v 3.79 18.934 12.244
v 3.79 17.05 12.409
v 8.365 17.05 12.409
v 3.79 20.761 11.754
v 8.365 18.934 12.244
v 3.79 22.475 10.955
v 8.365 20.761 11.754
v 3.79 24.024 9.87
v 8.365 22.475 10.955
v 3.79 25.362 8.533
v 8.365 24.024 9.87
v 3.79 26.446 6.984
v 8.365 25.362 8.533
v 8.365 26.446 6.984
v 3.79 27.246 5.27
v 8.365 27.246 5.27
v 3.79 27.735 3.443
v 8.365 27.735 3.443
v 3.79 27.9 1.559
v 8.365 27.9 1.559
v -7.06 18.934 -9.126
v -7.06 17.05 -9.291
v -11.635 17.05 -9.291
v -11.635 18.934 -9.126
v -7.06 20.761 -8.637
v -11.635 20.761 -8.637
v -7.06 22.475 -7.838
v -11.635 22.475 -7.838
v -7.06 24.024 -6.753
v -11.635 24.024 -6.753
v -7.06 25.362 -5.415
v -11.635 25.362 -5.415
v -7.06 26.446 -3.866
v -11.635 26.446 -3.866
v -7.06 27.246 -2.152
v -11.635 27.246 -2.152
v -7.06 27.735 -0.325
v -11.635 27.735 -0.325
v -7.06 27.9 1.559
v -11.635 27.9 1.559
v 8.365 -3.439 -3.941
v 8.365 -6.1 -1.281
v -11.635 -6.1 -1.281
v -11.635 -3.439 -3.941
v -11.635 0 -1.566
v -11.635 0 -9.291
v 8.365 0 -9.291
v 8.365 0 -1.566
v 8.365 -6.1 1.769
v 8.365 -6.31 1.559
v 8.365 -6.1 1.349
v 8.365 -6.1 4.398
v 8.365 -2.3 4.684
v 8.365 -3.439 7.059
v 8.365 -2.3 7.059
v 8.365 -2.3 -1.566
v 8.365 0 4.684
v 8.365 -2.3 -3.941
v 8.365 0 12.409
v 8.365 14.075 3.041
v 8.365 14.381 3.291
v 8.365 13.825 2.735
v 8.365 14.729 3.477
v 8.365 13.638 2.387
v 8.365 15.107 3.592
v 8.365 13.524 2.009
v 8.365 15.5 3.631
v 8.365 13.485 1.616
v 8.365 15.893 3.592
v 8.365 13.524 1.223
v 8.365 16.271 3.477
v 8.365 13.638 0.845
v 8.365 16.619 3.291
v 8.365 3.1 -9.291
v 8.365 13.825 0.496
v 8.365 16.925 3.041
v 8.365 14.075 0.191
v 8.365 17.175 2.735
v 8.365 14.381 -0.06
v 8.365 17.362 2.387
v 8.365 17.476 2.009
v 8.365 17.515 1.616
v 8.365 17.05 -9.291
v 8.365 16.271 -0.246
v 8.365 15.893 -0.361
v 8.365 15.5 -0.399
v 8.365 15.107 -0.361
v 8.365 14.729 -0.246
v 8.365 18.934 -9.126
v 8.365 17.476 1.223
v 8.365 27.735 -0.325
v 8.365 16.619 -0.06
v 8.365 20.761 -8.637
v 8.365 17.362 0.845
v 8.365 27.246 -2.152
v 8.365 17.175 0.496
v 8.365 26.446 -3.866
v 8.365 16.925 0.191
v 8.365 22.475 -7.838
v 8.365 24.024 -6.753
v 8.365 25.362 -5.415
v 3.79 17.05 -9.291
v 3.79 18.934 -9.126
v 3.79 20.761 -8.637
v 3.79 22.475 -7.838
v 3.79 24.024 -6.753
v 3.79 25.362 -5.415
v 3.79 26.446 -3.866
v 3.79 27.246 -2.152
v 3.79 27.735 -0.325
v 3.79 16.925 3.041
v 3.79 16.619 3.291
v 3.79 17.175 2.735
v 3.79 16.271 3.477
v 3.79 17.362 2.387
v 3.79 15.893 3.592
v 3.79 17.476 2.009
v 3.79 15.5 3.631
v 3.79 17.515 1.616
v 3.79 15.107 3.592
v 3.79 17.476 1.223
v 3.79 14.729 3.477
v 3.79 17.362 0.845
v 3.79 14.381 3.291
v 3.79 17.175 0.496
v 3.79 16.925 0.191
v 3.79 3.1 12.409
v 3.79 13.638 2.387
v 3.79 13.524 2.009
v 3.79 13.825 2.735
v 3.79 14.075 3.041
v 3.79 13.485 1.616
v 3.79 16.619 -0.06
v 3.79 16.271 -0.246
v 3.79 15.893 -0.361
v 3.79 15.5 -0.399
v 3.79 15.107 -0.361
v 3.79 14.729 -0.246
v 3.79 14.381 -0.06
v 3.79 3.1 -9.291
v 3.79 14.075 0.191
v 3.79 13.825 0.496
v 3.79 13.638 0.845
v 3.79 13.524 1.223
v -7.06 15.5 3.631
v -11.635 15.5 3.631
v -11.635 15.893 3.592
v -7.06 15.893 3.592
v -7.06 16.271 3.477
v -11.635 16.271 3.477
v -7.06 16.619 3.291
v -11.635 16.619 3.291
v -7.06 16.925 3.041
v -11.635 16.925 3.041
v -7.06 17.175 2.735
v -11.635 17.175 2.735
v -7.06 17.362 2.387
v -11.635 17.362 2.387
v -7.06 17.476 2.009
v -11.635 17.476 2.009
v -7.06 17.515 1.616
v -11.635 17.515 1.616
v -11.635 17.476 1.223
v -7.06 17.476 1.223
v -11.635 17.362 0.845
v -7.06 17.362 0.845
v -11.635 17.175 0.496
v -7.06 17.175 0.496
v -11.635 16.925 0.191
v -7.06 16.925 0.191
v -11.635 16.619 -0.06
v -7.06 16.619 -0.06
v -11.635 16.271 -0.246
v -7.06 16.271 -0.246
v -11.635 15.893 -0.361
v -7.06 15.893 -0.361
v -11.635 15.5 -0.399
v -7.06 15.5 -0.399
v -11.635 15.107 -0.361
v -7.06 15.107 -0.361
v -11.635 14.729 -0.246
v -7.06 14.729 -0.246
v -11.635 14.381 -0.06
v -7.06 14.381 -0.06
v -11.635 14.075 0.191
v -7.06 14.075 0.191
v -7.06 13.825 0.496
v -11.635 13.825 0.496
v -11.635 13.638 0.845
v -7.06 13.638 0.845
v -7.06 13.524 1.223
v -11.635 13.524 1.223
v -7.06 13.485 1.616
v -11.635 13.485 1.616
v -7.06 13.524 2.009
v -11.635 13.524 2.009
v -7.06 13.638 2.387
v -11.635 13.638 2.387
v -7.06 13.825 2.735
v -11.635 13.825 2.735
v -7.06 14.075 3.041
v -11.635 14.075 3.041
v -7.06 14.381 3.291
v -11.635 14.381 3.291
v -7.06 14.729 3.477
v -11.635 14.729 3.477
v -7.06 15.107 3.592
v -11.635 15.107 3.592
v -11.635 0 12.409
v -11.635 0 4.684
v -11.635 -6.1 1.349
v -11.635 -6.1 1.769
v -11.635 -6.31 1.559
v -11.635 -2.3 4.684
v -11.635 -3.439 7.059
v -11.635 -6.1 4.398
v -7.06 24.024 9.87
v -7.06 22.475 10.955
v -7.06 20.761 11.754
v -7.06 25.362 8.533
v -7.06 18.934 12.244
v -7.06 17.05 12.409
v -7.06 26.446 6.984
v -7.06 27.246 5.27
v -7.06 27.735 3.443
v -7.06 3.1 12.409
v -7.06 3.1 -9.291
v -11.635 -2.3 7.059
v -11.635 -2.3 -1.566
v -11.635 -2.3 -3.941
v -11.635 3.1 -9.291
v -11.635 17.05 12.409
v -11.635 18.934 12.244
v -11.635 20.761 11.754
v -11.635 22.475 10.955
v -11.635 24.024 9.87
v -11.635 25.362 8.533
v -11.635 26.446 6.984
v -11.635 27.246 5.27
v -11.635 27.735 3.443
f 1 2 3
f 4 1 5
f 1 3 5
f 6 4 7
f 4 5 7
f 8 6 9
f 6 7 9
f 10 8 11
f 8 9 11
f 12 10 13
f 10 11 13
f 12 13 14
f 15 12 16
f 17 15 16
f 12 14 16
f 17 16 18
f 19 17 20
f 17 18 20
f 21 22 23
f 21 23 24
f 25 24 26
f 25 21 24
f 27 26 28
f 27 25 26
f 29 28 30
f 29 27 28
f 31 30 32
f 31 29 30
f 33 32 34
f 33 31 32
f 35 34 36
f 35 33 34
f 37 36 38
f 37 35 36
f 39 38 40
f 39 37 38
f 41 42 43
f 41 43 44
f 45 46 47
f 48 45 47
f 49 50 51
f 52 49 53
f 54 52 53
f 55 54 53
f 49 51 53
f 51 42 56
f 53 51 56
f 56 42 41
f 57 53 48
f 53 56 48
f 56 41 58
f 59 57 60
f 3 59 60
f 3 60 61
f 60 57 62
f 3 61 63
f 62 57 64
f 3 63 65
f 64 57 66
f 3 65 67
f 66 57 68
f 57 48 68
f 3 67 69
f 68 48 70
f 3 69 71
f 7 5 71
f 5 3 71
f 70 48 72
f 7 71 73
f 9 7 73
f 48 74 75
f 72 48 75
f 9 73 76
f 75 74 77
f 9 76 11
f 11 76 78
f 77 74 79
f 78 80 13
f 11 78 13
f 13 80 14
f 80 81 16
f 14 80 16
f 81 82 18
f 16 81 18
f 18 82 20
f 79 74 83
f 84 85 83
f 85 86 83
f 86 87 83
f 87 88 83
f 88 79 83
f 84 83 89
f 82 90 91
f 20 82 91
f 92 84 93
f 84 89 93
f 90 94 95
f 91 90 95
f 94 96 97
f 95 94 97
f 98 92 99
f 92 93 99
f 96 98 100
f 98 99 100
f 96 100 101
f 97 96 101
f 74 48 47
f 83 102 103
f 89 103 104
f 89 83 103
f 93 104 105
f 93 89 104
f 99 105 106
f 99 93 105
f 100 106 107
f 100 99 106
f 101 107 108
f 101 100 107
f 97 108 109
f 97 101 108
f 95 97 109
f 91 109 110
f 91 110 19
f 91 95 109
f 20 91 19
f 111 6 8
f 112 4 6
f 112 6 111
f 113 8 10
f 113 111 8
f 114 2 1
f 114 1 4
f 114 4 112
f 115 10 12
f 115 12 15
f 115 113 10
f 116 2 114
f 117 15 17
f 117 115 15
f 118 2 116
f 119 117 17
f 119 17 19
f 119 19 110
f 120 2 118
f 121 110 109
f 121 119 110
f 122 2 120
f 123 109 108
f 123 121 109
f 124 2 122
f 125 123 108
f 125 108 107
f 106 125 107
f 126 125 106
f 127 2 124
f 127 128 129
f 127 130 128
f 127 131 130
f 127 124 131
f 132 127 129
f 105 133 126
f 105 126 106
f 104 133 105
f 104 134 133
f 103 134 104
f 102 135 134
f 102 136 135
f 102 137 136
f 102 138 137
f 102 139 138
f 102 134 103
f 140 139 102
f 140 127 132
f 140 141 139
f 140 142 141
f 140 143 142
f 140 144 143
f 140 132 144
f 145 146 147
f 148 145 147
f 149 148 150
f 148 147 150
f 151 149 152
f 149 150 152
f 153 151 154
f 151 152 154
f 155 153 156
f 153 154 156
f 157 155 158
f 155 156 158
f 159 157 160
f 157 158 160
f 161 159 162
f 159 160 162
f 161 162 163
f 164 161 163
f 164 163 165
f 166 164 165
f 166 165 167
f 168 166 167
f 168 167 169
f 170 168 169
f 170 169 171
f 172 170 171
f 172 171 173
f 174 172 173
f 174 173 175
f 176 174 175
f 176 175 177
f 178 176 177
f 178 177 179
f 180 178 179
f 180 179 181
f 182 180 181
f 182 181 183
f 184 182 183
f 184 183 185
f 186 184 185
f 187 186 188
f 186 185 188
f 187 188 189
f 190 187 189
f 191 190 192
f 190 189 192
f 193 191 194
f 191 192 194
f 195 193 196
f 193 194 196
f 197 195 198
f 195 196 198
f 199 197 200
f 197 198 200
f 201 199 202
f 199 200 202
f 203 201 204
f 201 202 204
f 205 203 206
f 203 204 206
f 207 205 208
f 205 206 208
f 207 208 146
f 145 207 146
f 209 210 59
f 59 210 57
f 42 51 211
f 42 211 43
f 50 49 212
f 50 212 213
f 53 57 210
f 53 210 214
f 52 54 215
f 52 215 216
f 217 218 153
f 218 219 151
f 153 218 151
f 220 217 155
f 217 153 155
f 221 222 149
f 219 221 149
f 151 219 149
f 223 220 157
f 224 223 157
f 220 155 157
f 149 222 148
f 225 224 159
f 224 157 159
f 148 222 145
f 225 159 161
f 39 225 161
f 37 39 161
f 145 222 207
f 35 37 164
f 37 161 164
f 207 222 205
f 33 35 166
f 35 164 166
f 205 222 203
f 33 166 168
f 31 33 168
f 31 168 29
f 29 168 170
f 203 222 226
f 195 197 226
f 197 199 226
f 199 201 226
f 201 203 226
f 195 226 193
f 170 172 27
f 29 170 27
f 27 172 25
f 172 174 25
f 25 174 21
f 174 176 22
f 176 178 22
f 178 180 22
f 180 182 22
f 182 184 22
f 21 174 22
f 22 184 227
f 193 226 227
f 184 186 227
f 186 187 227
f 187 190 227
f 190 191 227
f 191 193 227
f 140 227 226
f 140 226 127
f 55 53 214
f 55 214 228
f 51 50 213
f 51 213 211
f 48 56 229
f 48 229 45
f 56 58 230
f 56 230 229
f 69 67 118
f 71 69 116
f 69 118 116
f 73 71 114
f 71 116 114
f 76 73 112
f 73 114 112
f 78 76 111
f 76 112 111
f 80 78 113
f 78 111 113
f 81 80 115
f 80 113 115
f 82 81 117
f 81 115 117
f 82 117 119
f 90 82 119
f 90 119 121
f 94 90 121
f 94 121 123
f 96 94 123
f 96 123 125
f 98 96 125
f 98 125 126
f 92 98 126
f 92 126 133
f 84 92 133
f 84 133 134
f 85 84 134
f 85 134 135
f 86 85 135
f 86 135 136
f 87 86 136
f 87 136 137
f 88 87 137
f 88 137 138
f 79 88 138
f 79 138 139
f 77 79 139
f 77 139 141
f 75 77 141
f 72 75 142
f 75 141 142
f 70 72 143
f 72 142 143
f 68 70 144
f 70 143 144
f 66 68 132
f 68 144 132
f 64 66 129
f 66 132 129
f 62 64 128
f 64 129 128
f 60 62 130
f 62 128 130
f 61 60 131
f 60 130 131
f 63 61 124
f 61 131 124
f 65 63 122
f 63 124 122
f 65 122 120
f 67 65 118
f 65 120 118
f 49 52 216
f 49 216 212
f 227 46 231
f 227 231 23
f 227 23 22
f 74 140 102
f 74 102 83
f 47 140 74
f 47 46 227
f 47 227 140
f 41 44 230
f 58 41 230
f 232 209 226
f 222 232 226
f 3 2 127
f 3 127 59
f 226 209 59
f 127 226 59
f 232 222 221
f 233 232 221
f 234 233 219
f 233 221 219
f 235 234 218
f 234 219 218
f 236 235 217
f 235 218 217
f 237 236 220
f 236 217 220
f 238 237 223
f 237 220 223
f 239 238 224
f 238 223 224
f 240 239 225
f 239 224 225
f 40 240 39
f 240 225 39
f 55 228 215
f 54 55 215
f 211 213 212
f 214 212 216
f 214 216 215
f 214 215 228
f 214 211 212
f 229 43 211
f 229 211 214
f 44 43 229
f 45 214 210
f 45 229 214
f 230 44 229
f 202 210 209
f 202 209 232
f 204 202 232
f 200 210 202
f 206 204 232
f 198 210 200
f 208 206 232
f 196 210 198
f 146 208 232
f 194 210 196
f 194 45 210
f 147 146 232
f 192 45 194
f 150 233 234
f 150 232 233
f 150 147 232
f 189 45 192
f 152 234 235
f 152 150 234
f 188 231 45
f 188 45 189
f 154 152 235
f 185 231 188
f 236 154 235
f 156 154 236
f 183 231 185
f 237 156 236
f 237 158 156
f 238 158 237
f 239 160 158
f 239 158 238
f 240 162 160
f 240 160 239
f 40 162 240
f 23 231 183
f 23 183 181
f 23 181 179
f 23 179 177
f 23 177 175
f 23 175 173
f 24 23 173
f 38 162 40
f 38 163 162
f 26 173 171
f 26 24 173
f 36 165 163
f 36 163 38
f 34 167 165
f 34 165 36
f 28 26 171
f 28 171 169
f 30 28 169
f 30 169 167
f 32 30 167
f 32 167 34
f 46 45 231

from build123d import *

# Parameters (mm, degrees)
SKETCH1_W           = 150
SKETCH1_H           = 70
BOSS_EXTRUDE1_DEPTH = 10
SKETCH2_W           = 18
SKETCH2_H           = 70
BOSS_EXTRUDE2_DEPTH = 80
FILLET1_R           = 35
SKETCH3_R           = 6.5
CUT_EXTRUDE1_DEPTH  = 164.102034121
RIB1_REACH          = 134.904
SKETCH5_WALL_W      = 321.142477346
SKETCH5_WALL_H      = 40
SKETCH7_W           = 43.830511012
SKETCH7_H           = 10.028409091
CUT_EXTRUDE2_DEPTH  = 80
SCALE1_SCALE        = 0.31
CUT_EXTRUDE5_REACH  = 46.882
SKETCH11_W          = 1.005
SKETCH11_H          = 10.85
SKETCH11_H_2        = 13.95
BOSS_EXTRUDE3_DEPTH = 20


with BuildPart() as part:
    # Sketch1 → Boss-Extrude1 (new body)
    with BuildSketch(Plane(origin=(0, 0, 0), x_dir=(1, 0, 0), z_dir=(0, 1, 0))):
        with Locations((14.225473782, -5.028409091)):
            Rectangle(SKETCH1_W, SKETCH1_H)
    extrude(amount=BOSS_EXTRUDE1_DEPTH)

    # Sketch2 → Boss-Extrude2 (add)
    with BuildSketch(Plane(origin=(0, 10, 0), x_dir=(1, 0, 0), z_dir=(0, 1, 0))):
        with Locations((-31.774526218, -5.028409091)):
            Rectangle(SKETCH2_W, SKETCH2_H)
        with Locations((21.225473782, -5.028409091)):
            Rectangle(SKETCH2_W, SKETCH2_H)
    extrude(amount=BOSS_EXTRUDE2_DEPTH)

    # Fillet1
    fillet1_edges = [part.edges().sort_by_distance(p)[0] for p in [
        (21.225473782, 90, 40.028409091),
        (21.225473782, 90, -29.971590909),
        (-31.774526218, 90, -29.971590909),
        (-31.774526218, 90, 40.028409091),
    ]]
    fillet(fillet1_edges, radius=FILLET1_R - 0.0001)  # a hair under: the kernel refuses the full size

    # Sketch3 → Cut-Extrude1 (cut, through all)
    with BuildSketch(Plane.ZY.offset(40.774526218)):
        with Locations((5.212032143, 50)):
            Circle(SKETCH3_R)
    extrude(amount=-CUT_EXTRUDE1_DEPTH, mode=Mode.SUBTRACT)

    # Sketch5 wall → Rib1 (add, up to next)
    with BuildSketch(Plane(origin=(52.140729288, 25.194278726, 0), x_dir=(0.821802771323, -0.569772064116, 0), z_dir=(0.569772064116, 0.821802771323, 0)), mode=Mode.PRIVATE) as rib1_sk1:
        Rectangle(SKETCH5_WALL_W, SKETCH5_WALL_H)
    rib1_tool1 = extrude(rib1_sk1.sketch, amount=-RIB1_REACH, mode=Mode.PRIVATE) - part.part
    add(rib1_tool1.solids().sort_by_distance((52.140729288, 25.194278726, 0))[0])

    # Sketch7 → Cut-Extrude2 (cut)
    with BuildSketch(Plane(origin=(0, 10, 0), x_dir=(1, 0, 0), z_dir=(0, 1, 0))):
        with Locations((52.140729288, 14.985795454)):
            Rectangle(SKETCH7_W, SKETCH7_H)
    extrude(amount=CUT_EXTRUDE2_DEPTH, mode=Mode.SUBTRACT)


with BuildPart() as part_1:
    # Scale1: scaled about (0, 0, 0)
    add(part.part.scale(SCALE1_SCALE))

    # Sketch11 → Cut-Extrude5 (cut, up to next)
    with BuildSketch(Plane(origin=(0, 0, -9.291193182), x_dir=(-1, 0, 0), z_dir=(0, 0, -1)), mode=Mode.PRIVATE) as cut_extrude5_sk1:
        Polygon((-9.369896872, 3.1), (-8.364896872, 3.1), (-8.364896872, 17.05), (-9.369896872, 17.05), (-9.369896872, 12.52045281), align=None)
    cut_extrude5_tool1 = extrude(cut_extrude5_sk1.sketch, amount=-CUT_EXTRUDE5_REACH, mode=Mode.PRIVATE) & part_1.part
    # Sketch11 → Cut-Extrude5 (cut, up to next)
    with BuildSketch(Plane(origin=(0, 0, -9.291193182), x_dir=(-1, 0, 0), z_dir=(0, 0, -1)), mode=Mode.PRIVATE) as cut_extrude5_sk2:
        with Locations((-8.867396872, 22.475)):
            Rectangle(SKETCH11_W, SKETCH11_H)
    cut_extrude5_tool2 = extrude(cut_extrude5_sk2.sketch, amount=-CUT_EXTRUDE5_REACH, mode=Mode.PRIVATE) & part_1.part
    # Sketch11 → Cut-Extrude5 (cut, up to next)
    with BuildSketch(Plane(origin=(0, 0, -9.291193182), x_dir=(-1, 0, 0), z_dir=(0, 0, -1)), mode=Mode.PRIVATE) as cut_extrude5_sk3:
        Polygon((-22.957355286, 3.1), (-9.369896872, 3.1), (-9.369896872, 12.52045281), align=None)
    cut_extrude5_tool3 = extrude(cut_extrude5_sk3.sketch, amount=-CUT_EXTRUDE5_REACH, mode=Mode.PRIVATE) & part_1.part
    # Sketch11 → Cut-Extrude5 (cut, up to next)
    with BuildSketch(Plane(origin=(0, 0, -9.291193182), x_dir=(-1, 0, 0), z_dir=(0, 0, -1)), mode=Mode.PRIVATE) as cut_extrude5_sk4:
        Polygon((-8.364896872, 0), (-8.364896872, 3.1), (-9.369896872, 3.1), (-22.957355286, 3.1), (-27.659896872, 3.1), (-27.659896872, 0), align=None)
    cut_extrude5_tool4 = extrude(cut_extrude5_sk4.sketch, amount=-CUT_EXTRUDE5_REACH, mode=Mode.PRIVATE) & part_1.part
    # Sketch11 → Cut-Extrude5 (cut, up to next)
    with BuildSketch(Plane(origin=(0, 0, -9.291193182), x_dir=(-1, 0, 0), z_dir=(0, 0, -1)), mode=Mode.PRIVATE) as cut_extrude5_sk5:
        with Locations((12.137603128, 10.075)):
            Rectangle(SKETCH11_W, SKETCH11_H_2)
    cut_extrude5_tool5 = extrude(cut_extrude5_sk5.sketch, amount=-CUT_EXTRUDE5_REACH, mode=Mode.PRIVATE) & part_1.part
    # Sketch11 → Cut-Extrude5 (cut, up to next)
    with BuildSketch(Plane(origin=(0, 0, -9.291193182), x_dir=(-1, 0, 0), z_dir=(0, 0, -1)), mode=Mode.PRIVATE) as cut_extrude5_sk6:
        with Locations((12.137603128, 22.475)):
            Rectangle(SKETCH11_W, SKETCH11_H)
    cut_extrude5_tool6 = extrude(cut_extrude5_sk6.sketch, amount=-CUT_EXTRUDE5_REACH, mode=Mode.PRIVATE) & part_1.part
    # Sketch11 → Cut-Extrude5 (cut, up to next)
    with BuildSketch(Plane(origin=(0, 0, -9.291193182), x_dir=(-1, 0, 0), z_dir=(0, 0, -1)), mode=Mode.PRIVATE) as cut_extrude5_sk7:
        Polygon((12.640103128, 3.1), (11.635103128, 3.1), (11.635103128, 0), (18.840103128, 0), (18.840103128, 3.1), align=None)
    cut_extrude5_tool7 = extrude(cut_extrude5_sk7.sketch, amount=-CUT_EXTRUDE5_REACH, mode=Mode.PRIVATE) & part_1.part
    add(cut_extrude5_tool1.solids().sort_by_distance((8.867397, 10.075, -9.291193))[0], mode=Mode.SUBTRACT)
    add(cut_extrude5_tool2.solids().sort_by_distance((8.867397, 22.475, -9.291193))[0], mode=Mode.SUBTRACT)
    add(cut_extrude5_tool3.solids().sort_by_distance((13.89905, 6.240151, -9.291193))[0], mode=Mode.SUBTRACT)
    add(cut_extrude5_tool4.solids().sort_by_distance((18.012397, 1.55, -9.291193))[0], mode=Mode.SUBTRACT)
    add(cut_extrude5_tool5.solids().sort_by_distance((-12.137603, 10.075, -9.291193))[0], mode=Mode.SUBTRACT)
    add(cut_extrude5_tool6.solids().sort_by_distance((-12.137603, 22.475, -9.291193))[0], mode=Mode.SUBTRACT)
    add(cut_extrude5_tool7.solids().sort_by_distance((-15.237603, 1.55, -9.291193))[0], mode=Mode.SUBTRACT)

    # Sketch13 → Boss-Extrude3 (add)
    with BuildSketch(Plane(origin=(8.364896872, 0, 0), x_dir=(0, 0, -1), z_dir=(1, 0, 0))):
        Polygon((1.566193182, -1.455), (1.566193182, 0), (-4.683806818, 0), (-4.683806818, -1.455), (-4.683806818, -1.8), (-4.683806818, -2.3), (-7.058806818, -2.3), (-7.058806818, -3.439339828), (-4.398146646, -6.1), (-1.768806818, -6.1), (-1.558806818, -6.31), (-1.348806818, -6.1), (1.28053301, -6.1), (3.941193182, -3.439339828), (3.941193182, -2.3), (1.566193182, -2.3), (1.566193182, -1.8), align=None)
    extrude(amount=-BOSS_EXTRUDE3_DEPTH)


solid = part_1.part
